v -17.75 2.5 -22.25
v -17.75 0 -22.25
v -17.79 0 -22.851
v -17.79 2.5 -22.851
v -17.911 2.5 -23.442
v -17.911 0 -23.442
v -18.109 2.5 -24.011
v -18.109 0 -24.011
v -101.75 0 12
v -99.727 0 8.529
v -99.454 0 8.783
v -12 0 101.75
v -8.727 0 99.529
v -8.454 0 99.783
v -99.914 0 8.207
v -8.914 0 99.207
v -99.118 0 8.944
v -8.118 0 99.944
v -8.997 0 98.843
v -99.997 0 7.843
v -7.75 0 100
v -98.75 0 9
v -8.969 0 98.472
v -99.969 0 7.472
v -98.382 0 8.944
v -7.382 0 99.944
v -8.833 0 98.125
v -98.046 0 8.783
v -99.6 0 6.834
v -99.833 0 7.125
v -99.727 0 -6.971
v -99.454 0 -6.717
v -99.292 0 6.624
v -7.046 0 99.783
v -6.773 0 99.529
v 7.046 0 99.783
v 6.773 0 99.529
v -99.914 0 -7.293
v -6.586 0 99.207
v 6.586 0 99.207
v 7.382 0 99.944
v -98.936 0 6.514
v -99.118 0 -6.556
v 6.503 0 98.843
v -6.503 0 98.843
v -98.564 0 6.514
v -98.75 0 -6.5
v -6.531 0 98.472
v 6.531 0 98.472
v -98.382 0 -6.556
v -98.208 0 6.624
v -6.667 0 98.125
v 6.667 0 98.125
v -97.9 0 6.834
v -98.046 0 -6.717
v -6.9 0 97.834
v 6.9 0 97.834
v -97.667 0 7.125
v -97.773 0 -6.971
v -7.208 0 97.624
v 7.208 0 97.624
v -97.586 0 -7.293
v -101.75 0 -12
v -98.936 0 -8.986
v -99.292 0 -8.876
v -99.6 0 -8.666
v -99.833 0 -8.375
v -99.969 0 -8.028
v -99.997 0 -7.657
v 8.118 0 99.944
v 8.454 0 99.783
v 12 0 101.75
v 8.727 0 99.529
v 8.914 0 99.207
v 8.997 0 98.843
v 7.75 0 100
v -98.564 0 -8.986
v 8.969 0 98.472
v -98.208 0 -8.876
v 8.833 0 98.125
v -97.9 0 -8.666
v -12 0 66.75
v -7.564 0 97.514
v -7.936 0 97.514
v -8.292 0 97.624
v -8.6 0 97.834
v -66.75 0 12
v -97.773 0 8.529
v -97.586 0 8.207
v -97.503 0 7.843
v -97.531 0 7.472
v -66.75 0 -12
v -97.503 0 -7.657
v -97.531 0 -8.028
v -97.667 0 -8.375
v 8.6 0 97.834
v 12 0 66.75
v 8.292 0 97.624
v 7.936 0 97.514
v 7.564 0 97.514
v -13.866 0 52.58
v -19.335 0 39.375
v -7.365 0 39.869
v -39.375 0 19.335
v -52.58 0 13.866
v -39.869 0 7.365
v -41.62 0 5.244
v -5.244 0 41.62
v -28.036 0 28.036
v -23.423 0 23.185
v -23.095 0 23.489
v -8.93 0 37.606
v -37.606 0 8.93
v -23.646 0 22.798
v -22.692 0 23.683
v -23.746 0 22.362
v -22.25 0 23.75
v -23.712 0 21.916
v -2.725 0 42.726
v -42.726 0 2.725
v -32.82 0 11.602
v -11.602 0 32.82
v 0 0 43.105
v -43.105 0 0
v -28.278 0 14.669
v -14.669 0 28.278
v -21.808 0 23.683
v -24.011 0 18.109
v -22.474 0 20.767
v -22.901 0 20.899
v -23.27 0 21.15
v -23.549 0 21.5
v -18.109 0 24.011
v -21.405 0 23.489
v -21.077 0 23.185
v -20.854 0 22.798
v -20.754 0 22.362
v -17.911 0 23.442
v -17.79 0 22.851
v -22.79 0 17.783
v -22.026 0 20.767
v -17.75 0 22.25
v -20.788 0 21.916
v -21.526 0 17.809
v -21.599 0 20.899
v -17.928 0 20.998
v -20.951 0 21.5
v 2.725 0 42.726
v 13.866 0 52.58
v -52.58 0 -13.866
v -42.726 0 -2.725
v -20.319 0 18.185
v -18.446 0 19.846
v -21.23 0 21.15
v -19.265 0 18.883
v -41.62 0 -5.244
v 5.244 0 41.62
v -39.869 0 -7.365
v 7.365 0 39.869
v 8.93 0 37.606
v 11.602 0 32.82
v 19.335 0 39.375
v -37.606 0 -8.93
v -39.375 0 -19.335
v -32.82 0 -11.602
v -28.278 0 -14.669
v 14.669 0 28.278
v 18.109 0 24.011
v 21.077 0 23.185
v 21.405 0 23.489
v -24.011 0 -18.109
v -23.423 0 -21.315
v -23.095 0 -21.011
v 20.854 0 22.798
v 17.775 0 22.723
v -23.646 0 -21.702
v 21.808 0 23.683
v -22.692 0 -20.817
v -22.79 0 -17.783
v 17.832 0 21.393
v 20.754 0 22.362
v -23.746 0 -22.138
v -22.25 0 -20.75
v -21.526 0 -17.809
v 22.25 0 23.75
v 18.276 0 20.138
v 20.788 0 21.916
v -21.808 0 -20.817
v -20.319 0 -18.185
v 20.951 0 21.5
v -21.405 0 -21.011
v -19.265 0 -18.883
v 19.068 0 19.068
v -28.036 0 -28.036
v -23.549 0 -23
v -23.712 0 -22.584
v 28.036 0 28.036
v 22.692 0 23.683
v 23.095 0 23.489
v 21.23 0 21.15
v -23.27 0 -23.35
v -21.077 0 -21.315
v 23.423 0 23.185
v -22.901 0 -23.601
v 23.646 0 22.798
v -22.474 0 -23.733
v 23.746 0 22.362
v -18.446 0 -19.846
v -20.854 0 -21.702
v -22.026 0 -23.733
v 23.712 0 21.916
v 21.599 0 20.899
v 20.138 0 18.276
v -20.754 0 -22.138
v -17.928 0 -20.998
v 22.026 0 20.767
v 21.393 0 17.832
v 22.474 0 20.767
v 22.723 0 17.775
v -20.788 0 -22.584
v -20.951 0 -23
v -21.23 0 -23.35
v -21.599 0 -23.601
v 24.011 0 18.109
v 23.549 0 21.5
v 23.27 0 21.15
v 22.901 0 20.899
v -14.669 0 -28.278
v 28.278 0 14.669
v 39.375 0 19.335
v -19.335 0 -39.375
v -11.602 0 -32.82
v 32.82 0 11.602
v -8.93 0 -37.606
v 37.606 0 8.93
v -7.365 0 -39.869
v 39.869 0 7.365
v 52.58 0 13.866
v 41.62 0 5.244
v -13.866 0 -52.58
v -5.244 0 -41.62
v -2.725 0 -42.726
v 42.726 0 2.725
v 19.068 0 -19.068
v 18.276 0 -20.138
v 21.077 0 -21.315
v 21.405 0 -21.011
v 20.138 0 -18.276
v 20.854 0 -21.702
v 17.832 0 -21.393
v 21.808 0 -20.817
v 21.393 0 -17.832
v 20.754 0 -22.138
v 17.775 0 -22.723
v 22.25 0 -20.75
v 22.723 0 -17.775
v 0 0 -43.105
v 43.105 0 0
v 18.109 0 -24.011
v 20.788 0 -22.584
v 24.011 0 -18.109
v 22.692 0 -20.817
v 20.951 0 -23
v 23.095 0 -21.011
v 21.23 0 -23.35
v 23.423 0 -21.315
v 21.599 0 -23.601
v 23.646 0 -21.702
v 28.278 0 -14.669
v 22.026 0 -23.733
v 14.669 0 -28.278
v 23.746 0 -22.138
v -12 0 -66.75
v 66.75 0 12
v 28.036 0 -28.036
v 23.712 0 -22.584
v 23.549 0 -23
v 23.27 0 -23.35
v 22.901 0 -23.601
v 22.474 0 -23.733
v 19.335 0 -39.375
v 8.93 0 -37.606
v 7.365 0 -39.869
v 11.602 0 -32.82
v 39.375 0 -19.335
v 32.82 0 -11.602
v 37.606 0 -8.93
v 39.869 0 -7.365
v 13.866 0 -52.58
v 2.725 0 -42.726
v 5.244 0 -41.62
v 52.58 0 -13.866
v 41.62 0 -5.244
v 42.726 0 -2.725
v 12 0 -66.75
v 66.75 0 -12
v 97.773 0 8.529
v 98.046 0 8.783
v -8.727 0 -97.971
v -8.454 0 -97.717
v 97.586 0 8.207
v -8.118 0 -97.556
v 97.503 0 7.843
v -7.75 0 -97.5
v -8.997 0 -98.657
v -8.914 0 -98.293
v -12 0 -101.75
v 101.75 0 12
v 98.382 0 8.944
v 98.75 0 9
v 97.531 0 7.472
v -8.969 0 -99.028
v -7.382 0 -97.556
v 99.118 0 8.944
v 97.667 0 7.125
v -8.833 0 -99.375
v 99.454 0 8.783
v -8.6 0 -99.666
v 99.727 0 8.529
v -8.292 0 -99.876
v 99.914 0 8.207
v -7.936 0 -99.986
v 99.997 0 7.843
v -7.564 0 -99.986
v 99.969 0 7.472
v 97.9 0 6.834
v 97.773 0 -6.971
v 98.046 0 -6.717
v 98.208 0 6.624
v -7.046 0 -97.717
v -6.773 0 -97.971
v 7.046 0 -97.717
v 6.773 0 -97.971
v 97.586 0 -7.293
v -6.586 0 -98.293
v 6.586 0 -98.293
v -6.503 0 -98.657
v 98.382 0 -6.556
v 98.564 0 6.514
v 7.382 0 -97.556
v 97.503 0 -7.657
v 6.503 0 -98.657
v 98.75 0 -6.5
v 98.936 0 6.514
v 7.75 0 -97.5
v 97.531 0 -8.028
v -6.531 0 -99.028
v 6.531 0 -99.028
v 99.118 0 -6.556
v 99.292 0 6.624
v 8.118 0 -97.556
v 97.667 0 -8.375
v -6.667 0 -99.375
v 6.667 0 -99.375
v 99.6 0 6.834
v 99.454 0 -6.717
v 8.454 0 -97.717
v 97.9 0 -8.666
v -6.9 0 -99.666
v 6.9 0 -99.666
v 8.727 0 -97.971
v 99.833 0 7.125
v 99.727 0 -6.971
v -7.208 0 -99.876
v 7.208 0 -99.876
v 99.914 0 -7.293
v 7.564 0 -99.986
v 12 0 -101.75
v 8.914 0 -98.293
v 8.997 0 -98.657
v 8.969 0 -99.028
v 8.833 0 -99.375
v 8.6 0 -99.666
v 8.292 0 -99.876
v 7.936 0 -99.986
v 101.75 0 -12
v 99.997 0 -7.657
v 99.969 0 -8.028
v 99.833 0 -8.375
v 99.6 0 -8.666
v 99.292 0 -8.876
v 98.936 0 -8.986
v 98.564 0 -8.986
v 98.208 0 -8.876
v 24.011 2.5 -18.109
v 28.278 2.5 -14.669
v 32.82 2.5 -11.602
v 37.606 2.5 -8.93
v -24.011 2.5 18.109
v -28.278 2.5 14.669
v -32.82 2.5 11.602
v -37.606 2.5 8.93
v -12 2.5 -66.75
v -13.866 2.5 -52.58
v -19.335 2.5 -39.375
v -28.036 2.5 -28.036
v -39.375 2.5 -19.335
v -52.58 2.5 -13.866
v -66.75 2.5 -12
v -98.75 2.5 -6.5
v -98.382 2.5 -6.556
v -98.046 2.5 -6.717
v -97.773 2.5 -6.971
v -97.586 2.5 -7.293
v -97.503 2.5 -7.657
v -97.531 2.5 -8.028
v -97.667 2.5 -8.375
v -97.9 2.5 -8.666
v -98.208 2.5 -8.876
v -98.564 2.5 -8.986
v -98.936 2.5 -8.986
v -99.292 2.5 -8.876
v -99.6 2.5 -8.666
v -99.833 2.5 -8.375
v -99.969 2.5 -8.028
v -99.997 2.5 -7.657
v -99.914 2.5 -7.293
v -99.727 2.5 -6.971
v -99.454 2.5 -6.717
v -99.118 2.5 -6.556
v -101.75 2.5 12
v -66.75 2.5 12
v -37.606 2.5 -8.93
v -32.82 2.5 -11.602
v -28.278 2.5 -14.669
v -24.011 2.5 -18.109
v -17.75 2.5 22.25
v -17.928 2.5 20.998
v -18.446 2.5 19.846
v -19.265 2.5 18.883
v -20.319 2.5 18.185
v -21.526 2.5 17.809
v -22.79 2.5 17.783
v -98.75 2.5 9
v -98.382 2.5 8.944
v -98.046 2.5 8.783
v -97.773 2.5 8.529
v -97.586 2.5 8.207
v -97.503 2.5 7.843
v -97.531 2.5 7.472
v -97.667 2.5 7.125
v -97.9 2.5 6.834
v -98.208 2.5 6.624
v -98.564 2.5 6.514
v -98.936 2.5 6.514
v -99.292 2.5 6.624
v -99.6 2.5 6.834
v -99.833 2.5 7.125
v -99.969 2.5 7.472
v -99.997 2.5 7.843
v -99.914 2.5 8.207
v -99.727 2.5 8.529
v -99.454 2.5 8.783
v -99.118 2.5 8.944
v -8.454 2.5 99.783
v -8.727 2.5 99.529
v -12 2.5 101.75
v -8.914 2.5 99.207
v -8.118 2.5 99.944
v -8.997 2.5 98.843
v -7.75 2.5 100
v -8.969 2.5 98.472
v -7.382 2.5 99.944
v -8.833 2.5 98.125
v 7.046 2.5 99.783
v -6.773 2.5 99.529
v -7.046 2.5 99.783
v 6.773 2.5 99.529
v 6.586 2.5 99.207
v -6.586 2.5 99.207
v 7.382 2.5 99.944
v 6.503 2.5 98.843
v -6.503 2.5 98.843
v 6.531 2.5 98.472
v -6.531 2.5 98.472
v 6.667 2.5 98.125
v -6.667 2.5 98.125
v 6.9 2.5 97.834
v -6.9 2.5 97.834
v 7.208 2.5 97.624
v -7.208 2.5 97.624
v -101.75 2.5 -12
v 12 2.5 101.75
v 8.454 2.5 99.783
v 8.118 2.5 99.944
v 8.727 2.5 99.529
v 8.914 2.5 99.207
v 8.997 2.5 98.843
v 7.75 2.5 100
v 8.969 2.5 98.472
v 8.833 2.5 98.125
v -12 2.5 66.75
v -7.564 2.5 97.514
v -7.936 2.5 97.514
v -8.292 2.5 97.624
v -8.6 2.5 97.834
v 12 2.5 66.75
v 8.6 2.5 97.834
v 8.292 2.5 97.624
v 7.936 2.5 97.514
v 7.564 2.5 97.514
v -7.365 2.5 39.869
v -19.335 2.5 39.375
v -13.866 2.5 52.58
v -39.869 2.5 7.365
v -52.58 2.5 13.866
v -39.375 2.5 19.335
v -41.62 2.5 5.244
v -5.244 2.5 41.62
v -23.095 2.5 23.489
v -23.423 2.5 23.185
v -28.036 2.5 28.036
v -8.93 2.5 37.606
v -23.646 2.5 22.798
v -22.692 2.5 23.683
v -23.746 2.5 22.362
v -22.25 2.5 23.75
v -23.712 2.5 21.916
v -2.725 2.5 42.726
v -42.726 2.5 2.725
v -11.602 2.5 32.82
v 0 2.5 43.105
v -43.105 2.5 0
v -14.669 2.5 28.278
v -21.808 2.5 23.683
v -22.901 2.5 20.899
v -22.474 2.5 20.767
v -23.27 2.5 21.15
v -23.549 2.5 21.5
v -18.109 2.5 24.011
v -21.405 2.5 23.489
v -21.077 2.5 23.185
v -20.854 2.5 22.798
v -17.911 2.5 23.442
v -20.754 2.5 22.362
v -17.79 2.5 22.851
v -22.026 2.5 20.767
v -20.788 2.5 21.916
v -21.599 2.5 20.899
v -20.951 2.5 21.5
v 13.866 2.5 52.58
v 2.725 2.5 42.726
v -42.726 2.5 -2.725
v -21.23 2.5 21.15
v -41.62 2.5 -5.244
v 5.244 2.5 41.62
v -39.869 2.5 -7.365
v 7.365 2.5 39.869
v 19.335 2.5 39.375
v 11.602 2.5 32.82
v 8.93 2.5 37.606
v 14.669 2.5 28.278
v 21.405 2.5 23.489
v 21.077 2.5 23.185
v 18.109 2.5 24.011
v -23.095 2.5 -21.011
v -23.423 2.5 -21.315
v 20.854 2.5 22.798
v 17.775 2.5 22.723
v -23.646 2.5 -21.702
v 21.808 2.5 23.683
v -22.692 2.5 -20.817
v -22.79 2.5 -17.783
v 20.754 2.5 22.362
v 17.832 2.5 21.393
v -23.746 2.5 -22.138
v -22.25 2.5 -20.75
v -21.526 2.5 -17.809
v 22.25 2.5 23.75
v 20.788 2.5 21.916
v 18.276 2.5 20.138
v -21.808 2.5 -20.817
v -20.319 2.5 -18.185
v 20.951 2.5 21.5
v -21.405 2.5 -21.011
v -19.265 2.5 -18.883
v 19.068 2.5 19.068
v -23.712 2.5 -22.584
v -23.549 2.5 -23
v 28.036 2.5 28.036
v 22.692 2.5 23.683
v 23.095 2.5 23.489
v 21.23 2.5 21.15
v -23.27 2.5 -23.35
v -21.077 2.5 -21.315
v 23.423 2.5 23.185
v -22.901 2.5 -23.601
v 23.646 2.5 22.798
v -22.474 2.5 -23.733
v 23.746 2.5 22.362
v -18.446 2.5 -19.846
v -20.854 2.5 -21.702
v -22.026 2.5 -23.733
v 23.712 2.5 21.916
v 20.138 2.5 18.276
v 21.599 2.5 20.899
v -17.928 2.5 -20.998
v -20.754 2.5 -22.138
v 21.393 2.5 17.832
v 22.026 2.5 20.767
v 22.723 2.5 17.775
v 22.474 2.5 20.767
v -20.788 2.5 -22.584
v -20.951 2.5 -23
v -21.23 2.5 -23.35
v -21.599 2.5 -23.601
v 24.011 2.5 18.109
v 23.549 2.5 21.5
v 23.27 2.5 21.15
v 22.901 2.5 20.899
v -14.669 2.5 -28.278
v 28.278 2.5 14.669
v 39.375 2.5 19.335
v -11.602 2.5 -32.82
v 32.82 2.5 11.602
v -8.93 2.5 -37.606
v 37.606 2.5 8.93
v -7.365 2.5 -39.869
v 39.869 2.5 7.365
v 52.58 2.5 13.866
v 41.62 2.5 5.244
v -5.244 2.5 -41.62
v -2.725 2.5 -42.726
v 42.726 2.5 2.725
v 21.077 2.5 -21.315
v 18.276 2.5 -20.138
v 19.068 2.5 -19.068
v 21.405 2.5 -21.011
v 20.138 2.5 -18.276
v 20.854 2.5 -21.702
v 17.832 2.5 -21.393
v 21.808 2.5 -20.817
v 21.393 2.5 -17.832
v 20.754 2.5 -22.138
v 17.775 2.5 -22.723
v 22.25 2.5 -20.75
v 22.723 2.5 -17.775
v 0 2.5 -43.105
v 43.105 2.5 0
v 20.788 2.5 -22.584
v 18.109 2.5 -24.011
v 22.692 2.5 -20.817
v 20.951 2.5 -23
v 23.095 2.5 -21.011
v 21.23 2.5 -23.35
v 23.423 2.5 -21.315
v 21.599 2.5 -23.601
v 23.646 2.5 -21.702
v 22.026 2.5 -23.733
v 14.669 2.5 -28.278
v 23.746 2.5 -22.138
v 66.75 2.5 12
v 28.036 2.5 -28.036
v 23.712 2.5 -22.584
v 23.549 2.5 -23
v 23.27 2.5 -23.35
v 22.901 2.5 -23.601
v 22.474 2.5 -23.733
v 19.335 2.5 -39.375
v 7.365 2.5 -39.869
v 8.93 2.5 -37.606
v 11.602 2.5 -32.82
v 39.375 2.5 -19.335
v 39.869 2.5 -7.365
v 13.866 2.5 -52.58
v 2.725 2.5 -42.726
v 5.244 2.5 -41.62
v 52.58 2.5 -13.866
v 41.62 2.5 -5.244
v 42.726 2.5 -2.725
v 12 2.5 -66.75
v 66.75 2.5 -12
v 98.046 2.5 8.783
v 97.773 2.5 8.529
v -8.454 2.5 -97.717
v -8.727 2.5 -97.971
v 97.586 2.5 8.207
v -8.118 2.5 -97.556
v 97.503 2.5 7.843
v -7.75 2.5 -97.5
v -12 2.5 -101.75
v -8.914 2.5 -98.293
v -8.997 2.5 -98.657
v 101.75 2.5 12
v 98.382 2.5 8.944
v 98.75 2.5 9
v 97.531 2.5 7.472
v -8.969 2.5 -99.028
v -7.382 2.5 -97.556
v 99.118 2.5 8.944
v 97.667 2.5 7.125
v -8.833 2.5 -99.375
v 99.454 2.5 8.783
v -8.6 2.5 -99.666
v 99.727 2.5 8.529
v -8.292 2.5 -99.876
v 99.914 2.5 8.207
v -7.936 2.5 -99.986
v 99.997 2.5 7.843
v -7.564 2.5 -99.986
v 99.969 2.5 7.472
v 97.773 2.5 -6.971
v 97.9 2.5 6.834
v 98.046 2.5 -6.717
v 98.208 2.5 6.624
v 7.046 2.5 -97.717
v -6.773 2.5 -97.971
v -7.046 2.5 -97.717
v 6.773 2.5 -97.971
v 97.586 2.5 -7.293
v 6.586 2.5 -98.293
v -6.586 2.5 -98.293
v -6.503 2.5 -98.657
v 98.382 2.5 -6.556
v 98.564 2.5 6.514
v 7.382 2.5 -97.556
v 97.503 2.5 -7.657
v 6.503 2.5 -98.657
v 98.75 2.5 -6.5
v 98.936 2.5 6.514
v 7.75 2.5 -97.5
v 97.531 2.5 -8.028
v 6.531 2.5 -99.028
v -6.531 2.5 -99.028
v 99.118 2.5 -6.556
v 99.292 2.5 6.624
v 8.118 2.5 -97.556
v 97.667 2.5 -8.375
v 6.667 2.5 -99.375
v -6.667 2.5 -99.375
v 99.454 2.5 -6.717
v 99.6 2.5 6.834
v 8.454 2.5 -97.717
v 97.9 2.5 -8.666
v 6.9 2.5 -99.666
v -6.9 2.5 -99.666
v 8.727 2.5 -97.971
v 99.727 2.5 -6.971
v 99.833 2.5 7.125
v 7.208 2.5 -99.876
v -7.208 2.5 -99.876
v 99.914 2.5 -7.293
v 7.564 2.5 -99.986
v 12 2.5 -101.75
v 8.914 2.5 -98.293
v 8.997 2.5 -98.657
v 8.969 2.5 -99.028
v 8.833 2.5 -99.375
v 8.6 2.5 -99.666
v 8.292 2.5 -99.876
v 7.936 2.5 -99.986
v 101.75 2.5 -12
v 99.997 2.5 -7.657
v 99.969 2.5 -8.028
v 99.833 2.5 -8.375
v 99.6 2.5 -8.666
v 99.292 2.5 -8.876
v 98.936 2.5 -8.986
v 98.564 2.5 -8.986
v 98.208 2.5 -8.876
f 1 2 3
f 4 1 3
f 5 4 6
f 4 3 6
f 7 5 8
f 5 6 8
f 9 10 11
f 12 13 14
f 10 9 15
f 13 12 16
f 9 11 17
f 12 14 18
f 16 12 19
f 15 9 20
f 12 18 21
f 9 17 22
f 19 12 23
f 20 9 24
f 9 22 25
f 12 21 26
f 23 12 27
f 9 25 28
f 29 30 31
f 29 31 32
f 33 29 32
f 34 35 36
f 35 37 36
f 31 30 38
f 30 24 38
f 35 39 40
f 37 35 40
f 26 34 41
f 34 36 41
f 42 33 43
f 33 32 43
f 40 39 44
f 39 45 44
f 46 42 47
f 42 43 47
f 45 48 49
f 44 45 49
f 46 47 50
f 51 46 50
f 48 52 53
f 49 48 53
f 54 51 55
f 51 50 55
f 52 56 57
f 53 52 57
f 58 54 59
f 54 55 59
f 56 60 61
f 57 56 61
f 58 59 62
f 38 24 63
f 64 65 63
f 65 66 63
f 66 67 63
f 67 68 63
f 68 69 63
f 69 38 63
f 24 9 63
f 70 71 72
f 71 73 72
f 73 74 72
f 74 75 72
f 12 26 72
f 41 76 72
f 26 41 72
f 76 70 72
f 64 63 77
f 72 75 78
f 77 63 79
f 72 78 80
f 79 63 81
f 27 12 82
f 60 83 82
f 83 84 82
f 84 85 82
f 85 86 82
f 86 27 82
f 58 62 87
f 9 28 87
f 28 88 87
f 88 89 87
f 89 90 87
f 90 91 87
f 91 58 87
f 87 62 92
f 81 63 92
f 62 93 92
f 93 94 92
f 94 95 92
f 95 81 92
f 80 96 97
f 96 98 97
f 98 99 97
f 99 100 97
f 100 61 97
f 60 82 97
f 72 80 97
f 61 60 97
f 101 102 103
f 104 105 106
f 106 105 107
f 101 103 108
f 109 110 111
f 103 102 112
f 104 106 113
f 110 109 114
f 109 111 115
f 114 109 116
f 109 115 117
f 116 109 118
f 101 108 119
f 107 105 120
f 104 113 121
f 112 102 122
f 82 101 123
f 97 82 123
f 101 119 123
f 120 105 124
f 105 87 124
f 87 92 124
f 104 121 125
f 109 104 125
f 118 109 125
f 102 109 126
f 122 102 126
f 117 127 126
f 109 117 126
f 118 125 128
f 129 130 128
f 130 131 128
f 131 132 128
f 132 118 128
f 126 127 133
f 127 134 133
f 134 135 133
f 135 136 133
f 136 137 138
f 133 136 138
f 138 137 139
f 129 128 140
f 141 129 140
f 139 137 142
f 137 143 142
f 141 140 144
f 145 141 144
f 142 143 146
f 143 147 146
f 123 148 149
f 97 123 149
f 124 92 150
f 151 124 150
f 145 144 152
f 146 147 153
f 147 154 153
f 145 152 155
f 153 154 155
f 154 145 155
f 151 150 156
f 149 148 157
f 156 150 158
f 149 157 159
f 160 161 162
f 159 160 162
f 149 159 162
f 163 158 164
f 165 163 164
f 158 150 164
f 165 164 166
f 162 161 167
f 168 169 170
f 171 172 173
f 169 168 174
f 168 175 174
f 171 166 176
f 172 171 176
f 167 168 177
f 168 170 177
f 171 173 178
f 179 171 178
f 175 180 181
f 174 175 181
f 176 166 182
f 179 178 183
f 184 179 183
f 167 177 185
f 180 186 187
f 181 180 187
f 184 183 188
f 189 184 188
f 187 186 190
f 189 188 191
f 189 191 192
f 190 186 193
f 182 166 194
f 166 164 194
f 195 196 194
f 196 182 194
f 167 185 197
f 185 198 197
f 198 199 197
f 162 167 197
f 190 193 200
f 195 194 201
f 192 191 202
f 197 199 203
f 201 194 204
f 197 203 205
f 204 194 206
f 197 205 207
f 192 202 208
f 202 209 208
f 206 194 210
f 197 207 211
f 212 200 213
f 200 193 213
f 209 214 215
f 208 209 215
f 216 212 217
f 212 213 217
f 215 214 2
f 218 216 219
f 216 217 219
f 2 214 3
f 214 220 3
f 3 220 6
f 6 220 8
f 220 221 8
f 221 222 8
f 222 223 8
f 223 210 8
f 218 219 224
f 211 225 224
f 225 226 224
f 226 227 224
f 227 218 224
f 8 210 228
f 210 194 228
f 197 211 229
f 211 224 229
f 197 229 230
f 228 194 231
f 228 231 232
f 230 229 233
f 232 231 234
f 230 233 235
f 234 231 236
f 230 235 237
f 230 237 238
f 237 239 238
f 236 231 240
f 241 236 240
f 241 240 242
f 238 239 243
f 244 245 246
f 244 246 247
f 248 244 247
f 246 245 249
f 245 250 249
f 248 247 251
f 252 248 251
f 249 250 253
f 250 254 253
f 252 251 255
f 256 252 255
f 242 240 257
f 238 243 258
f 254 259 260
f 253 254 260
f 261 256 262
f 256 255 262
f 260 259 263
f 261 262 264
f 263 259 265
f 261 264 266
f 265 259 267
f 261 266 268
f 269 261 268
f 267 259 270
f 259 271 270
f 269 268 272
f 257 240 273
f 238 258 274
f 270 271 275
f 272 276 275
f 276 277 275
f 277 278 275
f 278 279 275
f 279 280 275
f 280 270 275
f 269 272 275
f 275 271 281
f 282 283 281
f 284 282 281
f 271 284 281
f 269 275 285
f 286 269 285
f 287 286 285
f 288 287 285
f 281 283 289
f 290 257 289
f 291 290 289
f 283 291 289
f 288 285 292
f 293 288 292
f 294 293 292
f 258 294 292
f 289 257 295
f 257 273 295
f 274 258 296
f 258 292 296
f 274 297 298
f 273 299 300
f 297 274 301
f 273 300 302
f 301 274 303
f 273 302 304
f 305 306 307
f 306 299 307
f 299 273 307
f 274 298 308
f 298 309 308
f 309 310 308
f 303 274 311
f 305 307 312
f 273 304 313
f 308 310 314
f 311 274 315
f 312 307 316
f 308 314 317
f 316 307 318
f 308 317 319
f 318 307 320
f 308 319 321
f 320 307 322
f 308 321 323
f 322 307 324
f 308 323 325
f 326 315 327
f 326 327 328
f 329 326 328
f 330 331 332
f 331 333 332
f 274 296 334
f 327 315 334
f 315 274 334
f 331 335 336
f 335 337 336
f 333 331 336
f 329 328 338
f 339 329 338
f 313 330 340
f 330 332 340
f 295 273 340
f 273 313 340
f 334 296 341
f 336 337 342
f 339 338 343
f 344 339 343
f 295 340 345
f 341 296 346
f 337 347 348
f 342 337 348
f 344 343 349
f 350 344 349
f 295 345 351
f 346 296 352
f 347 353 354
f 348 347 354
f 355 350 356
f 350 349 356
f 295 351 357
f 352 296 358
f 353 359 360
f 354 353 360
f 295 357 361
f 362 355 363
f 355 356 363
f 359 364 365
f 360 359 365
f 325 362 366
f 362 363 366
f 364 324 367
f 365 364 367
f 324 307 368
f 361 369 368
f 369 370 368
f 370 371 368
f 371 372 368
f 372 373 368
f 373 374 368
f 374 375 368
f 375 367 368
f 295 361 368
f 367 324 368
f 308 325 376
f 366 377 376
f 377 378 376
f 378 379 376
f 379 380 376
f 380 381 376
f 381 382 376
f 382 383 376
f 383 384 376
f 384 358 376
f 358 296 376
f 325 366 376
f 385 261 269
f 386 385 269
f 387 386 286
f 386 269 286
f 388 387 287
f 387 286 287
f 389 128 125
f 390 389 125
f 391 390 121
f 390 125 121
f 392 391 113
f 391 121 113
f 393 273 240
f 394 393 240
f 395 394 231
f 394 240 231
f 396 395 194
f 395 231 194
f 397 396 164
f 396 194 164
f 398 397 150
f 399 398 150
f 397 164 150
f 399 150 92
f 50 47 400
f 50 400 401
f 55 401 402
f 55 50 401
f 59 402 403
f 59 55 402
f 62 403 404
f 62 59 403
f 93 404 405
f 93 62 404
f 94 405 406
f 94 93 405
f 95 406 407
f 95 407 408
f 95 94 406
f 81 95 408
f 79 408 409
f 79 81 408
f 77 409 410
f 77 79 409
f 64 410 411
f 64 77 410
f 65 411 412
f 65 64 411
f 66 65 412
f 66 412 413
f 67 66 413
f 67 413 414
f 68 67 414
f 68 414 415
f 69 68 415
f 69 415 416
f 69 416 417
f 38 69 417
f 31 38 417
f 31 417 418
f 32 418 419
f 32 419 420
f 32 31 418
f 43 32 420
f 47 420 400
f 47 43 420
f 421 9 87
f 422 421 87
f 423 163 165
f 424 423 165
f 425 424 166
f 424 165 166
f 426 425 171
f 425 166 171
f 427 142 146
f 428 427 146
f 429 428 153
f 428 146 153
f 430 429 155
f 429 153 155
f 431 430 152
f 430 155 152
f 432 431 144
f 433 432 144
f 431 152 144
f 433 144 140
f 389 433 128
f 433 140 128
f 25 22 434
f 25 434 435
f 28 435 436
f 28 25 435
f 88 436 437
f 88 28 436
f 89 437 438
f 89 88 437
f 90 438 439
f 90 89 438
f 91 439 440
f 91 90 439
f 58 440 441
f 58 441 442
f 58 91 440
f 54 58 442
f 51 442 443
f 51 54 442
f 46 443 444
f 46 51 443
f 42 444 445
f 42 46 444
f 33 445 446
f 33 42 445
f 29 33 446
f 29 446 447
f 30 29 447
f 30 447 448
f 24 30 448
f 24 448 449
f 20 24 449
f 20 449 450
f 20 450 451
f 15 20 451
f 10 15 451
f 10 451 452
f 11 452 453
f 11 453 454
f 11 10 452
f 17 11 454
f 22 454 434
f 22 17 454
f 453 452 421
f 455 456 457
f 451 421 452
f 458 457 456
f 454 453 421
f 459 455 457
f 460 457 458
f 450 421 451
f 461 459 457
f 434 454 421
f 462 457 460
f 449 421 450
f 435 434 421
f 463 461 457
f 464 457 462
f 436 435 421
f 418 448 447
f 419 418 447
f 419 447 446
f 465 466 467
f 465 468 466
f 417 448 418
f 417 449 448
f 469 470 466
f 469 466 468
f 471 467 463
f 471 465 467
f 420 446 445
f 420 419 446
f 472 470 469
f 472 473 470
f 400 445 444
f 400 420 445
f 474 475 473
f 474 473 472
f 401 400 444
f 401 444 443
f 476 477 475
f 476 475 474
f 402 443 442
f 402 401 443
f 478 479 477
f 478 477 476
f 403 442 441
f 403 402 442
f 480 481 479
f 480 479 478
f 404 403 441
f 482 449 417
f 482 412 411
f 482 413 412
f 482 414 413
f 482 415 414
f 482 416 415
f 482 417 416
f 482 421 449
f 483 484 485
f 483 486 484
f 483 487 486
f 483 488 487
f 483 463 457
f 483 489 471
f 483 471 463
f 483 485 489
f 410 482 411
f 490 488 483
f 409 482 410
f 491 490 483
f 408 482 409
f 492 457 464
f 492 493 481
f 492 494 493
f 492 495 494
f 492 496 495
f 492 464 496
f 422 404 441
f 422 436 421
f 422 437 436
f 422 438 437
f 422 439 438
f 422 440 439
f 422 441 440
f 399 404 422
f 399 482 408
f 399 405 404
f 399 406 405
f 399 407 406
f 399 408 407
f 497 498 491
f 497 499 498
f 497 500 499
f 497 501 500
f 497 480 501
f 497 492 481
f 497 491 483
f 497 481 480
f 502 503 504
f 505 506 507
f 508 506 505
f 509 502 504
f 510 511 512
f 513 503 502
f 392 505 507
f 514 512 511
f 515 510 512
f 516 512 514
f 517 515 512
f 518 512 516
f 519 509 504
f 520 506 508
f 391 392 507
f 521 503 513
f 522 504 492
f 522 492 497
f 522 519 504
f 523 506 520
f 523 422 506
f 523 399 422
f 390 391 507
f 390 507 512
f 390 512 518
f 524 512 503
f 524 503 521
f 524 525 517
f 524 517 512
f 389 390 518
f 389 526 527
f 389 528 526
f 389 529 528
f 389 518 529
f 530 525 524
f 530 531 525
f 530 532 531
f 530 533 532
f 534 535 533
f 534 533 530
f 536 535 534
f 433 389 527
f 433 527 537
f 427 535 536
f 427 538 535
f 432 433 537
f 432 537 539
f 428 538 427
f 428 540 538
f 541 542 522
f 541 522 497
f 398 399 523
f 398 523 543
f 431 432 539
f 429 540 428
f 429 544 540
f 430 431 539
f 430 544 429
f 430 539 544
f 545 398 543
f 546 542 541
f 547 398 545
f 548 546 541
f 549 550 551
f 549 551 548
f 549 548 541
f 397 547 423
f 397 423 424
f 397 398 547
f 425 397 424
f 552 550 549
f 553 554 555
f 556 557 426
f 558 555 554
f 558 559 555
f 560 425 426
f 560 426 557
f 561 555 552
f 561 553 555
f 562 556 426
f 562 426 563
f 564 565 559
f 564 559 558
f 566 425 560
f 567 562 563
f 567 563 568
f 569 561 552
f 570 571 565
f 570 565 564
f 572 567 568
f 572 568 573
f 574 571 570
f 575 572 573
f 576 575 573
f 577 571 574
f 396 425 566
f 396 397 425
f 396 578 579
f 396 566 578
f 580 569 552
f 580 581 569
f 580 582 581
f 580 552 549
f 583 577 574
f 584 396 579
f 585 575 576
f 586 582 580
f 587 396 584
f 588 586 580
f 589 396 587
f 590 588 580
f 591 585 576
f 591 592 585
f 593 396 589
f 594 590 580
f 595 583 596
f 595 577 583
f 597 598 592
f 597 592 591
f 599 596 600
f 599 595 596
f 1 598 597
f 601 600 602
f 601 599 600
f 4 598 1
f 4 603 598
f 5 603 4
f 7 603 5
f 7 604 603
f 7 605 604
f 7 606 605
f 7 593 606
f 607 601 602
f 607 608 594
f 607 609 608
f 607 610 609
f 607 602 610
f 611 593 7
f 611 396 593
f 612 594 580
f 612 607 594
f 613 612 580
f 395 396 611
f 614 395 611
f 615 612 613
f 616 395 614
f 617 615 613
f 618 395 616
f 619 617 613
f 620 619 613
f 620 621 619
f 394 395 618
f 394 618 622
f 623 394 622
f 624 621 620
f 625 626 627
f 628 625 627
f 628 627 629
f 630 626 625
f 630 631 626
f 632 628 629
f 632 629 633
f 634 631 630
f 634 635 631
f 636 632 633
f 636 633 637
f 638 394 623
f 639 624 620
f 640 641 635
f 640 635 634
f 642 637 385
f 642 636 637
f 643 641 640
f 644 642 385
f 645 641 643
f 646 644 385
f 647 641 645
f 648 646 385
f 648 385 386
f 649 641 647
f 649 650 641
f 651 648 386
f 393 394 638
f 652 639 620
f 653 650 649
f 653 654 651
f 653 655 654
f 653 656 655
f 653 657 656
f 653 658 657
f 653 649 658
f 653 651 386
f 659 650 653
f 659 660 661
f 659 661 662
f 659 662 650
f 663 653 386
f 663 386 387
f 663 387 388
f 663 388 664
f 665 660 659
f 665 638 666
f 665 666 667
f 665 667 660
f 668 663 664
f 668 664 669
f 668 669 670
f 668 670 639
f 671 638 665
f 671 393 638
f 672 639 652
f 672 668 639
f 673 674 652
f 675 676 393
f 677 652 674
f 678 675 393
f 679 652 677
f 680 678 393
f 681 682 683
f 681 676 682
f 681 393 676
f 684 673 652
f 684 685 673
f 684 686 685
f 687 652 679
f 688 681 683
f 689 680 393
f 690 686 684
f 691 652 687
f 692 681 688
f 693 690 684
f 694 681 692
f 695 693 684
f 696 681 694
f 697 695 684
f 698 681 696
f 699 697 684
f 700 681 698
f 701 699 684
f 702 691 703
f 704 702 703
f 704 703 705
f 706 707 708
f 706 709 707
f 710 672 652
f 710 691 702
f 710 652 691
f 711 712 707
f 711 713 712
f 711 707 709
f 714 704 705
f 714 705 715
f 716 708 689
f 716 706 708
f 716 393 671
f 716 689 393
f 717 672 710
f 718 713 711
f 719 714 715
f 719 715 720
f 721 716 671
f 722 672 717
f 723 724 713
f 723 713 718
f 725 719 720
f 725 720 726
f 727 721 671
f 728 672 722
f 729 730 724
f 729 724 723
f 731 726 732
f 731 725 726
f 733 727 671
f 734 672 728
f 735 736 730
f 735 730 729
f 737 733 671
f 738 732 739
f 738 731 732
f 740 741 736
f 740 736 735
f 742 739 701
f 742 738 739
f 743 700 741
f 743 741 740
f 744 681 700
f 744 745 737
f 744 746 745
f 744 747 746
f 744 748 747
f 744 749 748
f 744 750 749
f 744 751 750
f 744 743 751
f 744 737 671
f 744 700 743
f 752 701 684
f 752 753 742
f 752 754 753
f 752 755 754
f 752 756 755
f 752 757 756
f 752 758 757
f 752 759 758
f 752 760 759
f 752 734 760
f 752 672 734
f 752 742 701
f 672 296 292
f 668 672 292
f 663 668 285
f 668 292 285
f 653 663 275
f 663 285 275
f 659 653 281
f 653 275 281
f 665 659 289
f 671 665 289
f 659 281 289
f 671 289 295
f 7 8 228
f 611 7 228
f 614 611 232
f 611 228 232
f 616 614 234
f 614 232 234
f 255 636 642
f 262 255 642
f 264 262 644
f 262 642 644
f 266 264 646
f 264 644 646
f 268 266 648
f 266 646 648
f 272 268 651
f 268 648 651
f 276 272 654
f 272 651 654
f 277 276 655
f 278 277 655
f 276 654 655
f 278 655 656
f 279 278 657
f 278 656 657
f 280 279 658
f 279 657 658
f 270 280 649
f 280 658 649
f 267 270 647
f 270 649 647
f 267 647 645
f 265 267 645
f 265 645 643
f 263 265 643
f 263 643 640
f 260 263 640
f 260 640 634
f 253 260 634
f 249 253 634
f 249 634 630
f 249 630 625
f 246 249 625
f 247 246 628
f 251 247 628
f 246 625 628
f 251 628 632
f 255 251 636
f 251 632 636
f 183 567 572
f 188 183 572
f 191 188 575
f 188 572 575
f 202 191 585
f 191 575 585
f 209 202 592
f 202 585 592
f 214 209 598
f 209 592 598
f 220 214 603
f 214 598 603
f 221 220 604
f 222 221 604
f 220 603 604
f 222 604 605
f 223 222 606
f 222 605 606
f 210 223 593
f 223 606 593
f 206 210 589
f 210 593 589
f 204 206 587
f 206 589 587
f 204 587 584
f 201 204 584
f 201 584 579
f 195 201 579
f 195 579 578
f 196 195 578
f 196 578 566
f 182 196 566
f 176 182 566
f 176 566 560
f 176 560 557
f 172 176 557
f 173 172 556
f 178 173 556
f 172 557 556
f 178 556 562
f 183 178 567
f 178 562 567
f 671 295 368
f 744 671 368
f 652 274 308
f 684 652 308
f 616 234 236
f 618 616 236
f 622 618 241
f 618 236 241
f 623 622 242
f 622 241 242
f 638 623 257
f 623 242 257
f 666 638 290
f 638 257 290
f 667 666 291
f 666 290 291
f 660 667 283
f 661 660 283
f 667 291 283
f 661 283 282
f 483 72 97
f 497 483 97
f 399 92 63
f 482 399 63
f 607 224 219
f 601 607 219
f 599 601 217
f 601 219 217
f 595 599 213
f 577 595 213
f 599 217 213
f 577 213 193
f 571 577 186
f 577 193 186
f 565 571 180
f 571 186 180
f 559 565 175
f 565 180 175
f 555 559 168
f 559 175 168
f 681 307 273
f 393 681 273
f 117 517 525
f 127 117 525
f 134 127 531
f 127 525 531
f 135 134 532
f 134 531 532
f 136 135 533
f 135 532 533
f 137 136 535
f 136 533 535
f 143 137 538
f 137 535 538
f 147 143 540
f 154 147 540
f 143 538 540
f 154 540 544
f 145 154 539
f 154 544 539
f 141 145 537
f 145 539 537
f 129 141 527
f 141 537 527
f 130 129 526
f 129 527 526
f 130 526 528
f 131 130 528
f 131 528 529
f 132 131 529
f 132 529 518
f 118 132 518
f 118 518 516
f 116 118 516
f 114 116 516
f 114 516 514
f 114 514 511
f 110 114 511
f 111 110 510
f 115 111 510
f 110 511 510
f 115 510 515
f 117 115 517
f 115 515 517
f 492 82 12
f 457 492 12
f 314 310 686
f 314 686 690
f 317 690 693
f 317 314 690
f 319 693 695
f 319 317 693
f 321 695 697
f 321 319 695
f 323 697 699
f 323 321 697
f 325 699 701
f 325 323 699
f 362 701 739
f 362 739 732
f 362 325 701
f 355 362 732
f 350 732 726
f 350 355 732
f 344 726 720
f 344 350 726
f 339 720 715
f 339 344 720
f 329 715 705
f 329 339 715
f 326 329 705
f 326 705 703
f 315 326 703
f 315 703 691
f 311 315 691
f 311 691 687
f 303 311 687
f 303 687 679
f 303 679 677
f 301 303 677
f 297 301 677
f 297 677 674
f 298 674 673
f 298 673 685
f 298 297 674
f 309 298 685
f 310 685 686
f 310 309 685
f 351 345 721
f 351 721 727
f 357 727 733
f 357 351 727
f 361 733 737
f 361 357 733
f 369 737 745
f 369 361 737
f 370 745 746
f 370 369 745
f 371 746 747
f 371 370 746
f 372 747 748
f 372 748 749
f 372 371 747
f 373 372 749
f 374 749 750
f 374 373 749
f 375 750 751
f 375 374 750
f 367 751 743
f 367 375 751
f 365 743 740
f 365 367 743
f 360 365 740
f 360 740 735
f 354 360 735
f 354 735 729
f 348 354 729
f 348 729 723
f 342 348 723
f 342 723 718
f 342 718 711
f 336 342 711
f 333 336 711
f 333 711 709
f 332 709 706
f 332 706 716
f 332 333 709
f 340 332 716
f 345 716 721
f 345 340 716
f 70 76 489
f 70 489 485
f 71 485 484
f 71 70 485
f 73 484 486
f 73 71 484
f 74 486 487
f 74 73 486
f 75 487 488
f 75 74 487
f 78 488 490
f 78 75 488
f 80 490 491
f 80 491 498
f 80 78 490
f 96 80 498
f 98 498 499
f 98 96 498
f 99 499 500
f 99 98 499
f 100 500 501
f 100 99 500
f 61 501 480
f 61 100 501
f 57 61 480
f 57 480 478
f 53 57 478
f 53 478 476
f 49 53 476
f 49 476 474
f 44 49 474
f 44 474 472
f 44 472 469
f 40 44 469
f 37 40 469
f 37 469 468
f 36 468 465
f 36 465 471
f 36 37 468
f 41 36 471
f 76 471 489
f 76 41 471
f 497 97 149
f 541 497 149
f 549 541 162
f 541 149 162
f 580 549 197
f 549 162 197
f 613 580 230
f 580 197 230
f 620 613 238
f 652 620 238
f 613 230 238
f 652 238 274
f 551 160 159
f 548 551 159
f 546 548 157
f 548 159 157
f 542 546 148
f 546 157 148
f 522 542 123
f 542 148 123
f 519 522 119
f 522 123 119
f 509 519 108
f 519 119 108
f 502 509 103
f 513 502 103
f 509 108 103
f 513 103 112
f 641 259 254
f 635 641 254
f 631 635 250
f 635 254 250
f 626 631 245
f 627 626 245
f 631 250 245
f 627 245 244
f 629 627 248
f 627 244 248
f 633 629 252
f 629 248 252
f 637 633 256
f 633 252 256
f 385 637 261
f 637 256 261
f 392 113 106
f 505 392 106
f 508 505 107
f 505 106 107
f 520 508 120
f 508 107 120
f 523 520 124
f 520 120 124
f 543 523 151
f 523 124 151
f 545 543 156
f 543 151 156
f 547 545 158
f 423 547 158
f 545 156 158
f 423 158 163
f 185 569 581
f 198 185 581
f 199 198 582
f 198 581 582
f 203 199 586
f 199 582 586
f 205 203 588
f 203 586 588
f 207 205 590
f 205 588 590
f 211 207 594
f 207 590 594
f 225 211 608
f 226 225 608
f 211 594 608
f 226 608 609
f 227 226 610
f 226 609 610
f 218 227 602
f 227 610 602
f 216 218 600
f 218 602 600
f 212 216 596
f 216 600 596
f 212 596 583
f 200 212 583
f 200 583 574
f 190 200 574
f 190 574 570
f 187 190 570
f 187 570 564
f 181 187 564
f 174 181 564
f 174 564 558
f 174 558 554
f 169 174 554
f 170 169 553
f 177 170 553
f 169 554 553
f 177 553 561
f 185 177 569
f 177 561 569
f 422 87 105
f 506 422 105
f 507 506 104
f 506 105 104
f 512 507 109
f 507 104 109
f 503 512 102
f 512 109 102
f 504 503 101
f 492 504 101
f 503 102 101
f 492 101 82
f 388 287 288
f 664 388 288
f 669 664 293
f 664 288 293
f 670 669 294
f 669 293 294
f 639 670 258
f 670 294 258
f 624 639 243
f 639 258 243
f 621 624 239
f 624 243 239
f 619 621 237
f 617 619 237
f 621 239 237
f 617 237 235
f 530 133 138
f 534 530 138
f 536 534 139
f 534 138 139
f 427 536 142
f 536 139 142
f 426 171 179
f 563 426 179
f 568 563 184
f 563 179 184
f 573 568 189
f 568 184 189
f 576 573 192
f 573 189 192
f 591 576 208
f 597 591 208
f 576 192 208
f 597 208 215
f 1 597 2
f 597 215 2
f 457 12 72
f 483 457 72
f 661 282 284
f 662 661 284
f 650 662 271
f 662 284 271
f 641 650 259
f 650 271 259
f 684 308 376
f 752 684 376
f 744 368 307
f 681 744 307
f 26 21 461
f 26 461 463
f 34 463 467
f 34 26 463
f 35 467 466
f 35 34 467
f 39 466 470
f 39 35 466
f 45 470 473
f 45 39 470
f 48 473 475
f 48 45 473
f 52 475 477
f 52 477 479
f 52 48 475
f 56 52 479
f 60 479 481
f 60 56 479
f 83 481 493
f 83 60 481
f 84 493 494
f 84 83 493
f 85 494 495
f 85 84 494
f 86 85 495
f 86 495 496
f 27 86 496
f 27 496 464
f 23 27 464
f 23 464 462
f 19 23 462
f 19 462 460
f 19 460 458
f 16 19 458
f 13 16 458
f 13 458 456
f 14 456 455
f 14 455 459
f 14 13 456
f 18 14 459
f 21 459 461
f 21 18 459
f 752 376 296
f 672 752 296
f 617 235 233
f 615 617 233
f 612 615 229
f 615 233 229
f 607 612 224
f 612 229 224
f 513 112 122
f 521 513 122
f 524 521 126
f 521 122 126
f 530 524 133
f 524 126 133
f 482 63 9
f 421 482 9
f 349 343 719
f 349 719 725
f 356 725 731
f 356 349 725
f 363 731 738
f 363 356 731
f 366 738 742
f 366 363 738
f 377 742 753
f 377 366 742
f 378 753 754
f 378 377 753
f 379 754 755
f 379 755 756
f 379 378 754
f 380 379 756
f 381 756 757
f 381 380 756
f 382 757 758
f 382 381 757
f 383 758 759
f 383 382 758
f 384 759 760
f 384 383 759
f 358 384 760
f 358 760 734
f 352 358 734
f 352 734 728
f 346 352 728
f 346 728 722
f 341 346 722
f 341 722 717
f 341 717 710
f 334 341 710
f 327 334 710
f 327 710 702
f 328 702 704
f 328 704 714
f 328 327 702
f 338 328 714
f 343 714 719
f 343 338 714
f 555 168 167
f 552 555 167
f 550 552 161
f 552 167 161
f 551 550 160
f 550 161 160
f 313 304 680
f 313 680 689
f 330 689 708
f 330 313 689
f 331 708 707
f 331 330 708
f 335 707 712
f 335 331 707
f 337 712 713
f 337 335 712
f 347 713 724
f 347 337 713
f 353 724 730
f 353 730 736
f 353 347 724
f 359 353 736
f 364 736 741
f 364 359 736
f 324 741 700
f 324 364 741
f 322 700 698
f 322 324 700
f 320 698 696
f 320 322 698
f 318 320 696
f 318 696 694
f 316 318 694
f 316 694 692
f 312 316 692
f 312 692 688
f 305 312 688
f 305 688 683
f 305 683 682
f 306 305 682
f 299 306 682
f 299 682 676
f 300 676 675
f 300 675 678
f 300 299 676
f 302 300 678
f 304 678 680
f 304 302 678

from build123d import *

# Parameters (mm, degrees)
SKETCH1_R           = 1.25
BOSS_EXTRUDE1_DEPTH = 2.5
BOSS_EXTRUDE2_START = -2.5
BOSS_EXTRUDE2_DEPTH = 2.5
SKETCH3_R           = 1.5
CUT_EXTRUDE1_DEPTH  = 2.5


with BuildPart() as part:
    # Sketch1 → Boss-Extrude1 (new body)
    with BuildSketch(Plane(origin=(0, 0, 0), x_dir=(1, 0, 0), z_dir=(0, 1, 0))):
        with BuildLine():
            Line((-12, 101.75), (-12, 66.75))
            ThreePointArc((-12, 66.75), (-28.03590373, 28.03590373), (-66.75, 12))
            Line((-66.75, 12), (-101.75, 12))
            Line((-101.75, 12), (-101.75, -12))
            Line((-101.75, -12), (-66.75, -12))
            ThreePointArc((-66.75, -12), (-28.03590373, -28.03590373), (-12, -66.75))
            Line((-12, -66.75), (-12, -101.75))
            Line((-12, -101.75), (12, -101.75))
            Line((12, -101.75), (12, -66.75))
            ThreePointArc((12, -66.75), (28.03590373, -28.03590373), (66.75, -12))
            Line((66.75, -12), (101.75, -12))
            Line((101.75, -12), (101.75, 12))
            Line((101.75, 12), (66.75, 12))
            ThreePointArc((66.75, 12), (28.03590373, 28.03590373), (12, 66.75))
            Line((12, 66.75), (12, 101.75))
            Line((12, 101.75), (-12, 101.75))
        make_face()
        with Locations(Location((-7.75, 98.75, 0), (0, 0, 270))):
            Circle(SKETCH1_R, mode=Mode.SUBTRACT)
        with Locations(Location((7.75, 98.75, 0), (0, 0, 270))):
            Circle(SKETCH1_R, mode=Mode.SUBTRACT)
        with Locations(Location((7.75, -98.75, 0), (0, 0, 270))):
            Circle(SKETCH1_R, mode=Mode.SUBTRACT)
        with Locations(Location((-7.75, -98.75, 0), (0, 0, 270))):
            Circle(SKETCH1_R, mode=Mode.SUBTRACT)
        with Locations(Location((98.75, 7.75, 0), (0, 0, 270))):
            Circle(SKETCH1_R, mode=Mode.SUBTRACT)
        with Locations(Location((98.75, -7.75, 0), (0, 0, 270))):
            Circle(SKETCH1_R, mode=Mode.SUBTRACT)
        with Locations(Location((-98.75, -7.75, 0), (0, 0, 270))):
            Circle(SKETCH1_R, mode=Mode.SUBTRACT)
        with Locations(Location((-98.75, 7.75, 0), (0, 0, 270))):
            Circle(SKETCH1_R, mode=Mode.SUBTRACT)
        with BuildLine():
            ThreePointArc((-8.929765886, -37.605823446), (-20.964835918, -20.964835918), (-37.605823446, -8.929765886))
            ThreePointArc((-37.605823446, -8.929765886), (-43.104792317, 0), (-37.605823446, 8.929765886))
            ThreePointArc((-37.605823446, 8.929765886), (-20.964835918, 20.964835918), (-8.929765886, 37.605823446))
            ThreePointArc((-8.929765886, 37.605823446), (0, 43.104792317), (8.929765886, 37.605823446))
            ThreePointArc((8.929765886, 37.605823446), (20.964835918, 20.964835918), (37.605823446, 8.929765886))
            ThreePointArc((37.605823446, 8.929765886), (43.104792317, 0), (37.605823446, -8.929765886))
            ThreePointArc((37.605823446, -8.929765886), (20.964835918, -20.964835918), (8.929765886, -37.605823446))
            ThreePointArc((8.929765886, -37.605823446), (0, -43.104792317), (-8.929765886, -37.605823446))
        make_face(mode=Mode.SUBTRACT)
    extrude(amount=BOSS_EXTRUDE1_DEPTH)

    # Sketch2 → Boss-Extrude2 (add)
    with BuildSketch(Plane(origin=(0, 2.5, 0), x_dir=(1, 0, 0), z_dir=(0, 1, 0)).offset(BOSS_EXTRUDE2_START)):
        with BuildLine():
            ThreePointArc((-18.108940598, -24.011143671), (-17.840648159, -23.148674772), (-17.75, -22.25))
            ThreePointArc((-17.75, -22.25), (-19.767576438, -18.496658387), (-24.011143671, -18.108940598))
            ThreePointArc((-24.011143671, -18.108940598), (-20.964835918, -20.964835918), (-18.108940598, -24.011143671))
        make_face()
        with BuildLine():
            ThreePointArc((-24.011143671, 18.108940598), (-19.767576438, 18.496658387), (-17.75, 22.25))
            ThreePointArc((-17.75, 22.25), (-17.840648159, 23.148674772), (-18.108940598, 24.011143671))
            ThreePointArc((-18.108940598, 24.011143671), (-20.964835918, 20.964835918), (-24.011143671, 18.108940598))
        make_face()
        with BuildLine():
            ThreePointArc((24.011143671, 18.108940598), (20.964835918, 20.964835918), (18.108940598, 24.011143671))
            ThreePointArc((18.108940598, 24.011143671), (19.068019485, 19.068019485), (24.011143671, 18.108940598))
        make_face()
        with BuildLine():
            ThreePointArc((18.108940598, -24.011143671), (20.964835918, -20.964835918), (24.011143671, -18.108940598))
            ThreePointArc((24.011143671, -18.108940598), (19.068019485, -19.068019485), (18.108940598, -24.011143671))
        make_face()
    extrude(amount=BOSS_EXTRUDE2_DEPTH)

    # Sketch3 → Cut-Extrude1 (cut)
    with BuildSketch(Plane(origin=(0, 2.5, 0), x_dir=(1, 0, 0), z_dir=(0, 1, 0))):
        with Locations(Location((-22.25, 22.25, 0), (0, 0, 270))):
            Circle(SKETCH3_R)
        with Locations(Location((22.25, 22.25, 0), (0, 0, 270))):
            Circle(SKETCH3_R)
        with Locations(Location((22.25, -22.25, 0), (0, 0, 270))):
            Circle(SKETCH3_R)
        with Locations(Location((-22.25, -22.25, 0), (0, 0, 270))):
            Circle(SKETCH3_R)
    extrude(amount=-CUT_EXTRUDE1_DEPTH, mode=Mode.SUBTRACT)


solid = part.part
